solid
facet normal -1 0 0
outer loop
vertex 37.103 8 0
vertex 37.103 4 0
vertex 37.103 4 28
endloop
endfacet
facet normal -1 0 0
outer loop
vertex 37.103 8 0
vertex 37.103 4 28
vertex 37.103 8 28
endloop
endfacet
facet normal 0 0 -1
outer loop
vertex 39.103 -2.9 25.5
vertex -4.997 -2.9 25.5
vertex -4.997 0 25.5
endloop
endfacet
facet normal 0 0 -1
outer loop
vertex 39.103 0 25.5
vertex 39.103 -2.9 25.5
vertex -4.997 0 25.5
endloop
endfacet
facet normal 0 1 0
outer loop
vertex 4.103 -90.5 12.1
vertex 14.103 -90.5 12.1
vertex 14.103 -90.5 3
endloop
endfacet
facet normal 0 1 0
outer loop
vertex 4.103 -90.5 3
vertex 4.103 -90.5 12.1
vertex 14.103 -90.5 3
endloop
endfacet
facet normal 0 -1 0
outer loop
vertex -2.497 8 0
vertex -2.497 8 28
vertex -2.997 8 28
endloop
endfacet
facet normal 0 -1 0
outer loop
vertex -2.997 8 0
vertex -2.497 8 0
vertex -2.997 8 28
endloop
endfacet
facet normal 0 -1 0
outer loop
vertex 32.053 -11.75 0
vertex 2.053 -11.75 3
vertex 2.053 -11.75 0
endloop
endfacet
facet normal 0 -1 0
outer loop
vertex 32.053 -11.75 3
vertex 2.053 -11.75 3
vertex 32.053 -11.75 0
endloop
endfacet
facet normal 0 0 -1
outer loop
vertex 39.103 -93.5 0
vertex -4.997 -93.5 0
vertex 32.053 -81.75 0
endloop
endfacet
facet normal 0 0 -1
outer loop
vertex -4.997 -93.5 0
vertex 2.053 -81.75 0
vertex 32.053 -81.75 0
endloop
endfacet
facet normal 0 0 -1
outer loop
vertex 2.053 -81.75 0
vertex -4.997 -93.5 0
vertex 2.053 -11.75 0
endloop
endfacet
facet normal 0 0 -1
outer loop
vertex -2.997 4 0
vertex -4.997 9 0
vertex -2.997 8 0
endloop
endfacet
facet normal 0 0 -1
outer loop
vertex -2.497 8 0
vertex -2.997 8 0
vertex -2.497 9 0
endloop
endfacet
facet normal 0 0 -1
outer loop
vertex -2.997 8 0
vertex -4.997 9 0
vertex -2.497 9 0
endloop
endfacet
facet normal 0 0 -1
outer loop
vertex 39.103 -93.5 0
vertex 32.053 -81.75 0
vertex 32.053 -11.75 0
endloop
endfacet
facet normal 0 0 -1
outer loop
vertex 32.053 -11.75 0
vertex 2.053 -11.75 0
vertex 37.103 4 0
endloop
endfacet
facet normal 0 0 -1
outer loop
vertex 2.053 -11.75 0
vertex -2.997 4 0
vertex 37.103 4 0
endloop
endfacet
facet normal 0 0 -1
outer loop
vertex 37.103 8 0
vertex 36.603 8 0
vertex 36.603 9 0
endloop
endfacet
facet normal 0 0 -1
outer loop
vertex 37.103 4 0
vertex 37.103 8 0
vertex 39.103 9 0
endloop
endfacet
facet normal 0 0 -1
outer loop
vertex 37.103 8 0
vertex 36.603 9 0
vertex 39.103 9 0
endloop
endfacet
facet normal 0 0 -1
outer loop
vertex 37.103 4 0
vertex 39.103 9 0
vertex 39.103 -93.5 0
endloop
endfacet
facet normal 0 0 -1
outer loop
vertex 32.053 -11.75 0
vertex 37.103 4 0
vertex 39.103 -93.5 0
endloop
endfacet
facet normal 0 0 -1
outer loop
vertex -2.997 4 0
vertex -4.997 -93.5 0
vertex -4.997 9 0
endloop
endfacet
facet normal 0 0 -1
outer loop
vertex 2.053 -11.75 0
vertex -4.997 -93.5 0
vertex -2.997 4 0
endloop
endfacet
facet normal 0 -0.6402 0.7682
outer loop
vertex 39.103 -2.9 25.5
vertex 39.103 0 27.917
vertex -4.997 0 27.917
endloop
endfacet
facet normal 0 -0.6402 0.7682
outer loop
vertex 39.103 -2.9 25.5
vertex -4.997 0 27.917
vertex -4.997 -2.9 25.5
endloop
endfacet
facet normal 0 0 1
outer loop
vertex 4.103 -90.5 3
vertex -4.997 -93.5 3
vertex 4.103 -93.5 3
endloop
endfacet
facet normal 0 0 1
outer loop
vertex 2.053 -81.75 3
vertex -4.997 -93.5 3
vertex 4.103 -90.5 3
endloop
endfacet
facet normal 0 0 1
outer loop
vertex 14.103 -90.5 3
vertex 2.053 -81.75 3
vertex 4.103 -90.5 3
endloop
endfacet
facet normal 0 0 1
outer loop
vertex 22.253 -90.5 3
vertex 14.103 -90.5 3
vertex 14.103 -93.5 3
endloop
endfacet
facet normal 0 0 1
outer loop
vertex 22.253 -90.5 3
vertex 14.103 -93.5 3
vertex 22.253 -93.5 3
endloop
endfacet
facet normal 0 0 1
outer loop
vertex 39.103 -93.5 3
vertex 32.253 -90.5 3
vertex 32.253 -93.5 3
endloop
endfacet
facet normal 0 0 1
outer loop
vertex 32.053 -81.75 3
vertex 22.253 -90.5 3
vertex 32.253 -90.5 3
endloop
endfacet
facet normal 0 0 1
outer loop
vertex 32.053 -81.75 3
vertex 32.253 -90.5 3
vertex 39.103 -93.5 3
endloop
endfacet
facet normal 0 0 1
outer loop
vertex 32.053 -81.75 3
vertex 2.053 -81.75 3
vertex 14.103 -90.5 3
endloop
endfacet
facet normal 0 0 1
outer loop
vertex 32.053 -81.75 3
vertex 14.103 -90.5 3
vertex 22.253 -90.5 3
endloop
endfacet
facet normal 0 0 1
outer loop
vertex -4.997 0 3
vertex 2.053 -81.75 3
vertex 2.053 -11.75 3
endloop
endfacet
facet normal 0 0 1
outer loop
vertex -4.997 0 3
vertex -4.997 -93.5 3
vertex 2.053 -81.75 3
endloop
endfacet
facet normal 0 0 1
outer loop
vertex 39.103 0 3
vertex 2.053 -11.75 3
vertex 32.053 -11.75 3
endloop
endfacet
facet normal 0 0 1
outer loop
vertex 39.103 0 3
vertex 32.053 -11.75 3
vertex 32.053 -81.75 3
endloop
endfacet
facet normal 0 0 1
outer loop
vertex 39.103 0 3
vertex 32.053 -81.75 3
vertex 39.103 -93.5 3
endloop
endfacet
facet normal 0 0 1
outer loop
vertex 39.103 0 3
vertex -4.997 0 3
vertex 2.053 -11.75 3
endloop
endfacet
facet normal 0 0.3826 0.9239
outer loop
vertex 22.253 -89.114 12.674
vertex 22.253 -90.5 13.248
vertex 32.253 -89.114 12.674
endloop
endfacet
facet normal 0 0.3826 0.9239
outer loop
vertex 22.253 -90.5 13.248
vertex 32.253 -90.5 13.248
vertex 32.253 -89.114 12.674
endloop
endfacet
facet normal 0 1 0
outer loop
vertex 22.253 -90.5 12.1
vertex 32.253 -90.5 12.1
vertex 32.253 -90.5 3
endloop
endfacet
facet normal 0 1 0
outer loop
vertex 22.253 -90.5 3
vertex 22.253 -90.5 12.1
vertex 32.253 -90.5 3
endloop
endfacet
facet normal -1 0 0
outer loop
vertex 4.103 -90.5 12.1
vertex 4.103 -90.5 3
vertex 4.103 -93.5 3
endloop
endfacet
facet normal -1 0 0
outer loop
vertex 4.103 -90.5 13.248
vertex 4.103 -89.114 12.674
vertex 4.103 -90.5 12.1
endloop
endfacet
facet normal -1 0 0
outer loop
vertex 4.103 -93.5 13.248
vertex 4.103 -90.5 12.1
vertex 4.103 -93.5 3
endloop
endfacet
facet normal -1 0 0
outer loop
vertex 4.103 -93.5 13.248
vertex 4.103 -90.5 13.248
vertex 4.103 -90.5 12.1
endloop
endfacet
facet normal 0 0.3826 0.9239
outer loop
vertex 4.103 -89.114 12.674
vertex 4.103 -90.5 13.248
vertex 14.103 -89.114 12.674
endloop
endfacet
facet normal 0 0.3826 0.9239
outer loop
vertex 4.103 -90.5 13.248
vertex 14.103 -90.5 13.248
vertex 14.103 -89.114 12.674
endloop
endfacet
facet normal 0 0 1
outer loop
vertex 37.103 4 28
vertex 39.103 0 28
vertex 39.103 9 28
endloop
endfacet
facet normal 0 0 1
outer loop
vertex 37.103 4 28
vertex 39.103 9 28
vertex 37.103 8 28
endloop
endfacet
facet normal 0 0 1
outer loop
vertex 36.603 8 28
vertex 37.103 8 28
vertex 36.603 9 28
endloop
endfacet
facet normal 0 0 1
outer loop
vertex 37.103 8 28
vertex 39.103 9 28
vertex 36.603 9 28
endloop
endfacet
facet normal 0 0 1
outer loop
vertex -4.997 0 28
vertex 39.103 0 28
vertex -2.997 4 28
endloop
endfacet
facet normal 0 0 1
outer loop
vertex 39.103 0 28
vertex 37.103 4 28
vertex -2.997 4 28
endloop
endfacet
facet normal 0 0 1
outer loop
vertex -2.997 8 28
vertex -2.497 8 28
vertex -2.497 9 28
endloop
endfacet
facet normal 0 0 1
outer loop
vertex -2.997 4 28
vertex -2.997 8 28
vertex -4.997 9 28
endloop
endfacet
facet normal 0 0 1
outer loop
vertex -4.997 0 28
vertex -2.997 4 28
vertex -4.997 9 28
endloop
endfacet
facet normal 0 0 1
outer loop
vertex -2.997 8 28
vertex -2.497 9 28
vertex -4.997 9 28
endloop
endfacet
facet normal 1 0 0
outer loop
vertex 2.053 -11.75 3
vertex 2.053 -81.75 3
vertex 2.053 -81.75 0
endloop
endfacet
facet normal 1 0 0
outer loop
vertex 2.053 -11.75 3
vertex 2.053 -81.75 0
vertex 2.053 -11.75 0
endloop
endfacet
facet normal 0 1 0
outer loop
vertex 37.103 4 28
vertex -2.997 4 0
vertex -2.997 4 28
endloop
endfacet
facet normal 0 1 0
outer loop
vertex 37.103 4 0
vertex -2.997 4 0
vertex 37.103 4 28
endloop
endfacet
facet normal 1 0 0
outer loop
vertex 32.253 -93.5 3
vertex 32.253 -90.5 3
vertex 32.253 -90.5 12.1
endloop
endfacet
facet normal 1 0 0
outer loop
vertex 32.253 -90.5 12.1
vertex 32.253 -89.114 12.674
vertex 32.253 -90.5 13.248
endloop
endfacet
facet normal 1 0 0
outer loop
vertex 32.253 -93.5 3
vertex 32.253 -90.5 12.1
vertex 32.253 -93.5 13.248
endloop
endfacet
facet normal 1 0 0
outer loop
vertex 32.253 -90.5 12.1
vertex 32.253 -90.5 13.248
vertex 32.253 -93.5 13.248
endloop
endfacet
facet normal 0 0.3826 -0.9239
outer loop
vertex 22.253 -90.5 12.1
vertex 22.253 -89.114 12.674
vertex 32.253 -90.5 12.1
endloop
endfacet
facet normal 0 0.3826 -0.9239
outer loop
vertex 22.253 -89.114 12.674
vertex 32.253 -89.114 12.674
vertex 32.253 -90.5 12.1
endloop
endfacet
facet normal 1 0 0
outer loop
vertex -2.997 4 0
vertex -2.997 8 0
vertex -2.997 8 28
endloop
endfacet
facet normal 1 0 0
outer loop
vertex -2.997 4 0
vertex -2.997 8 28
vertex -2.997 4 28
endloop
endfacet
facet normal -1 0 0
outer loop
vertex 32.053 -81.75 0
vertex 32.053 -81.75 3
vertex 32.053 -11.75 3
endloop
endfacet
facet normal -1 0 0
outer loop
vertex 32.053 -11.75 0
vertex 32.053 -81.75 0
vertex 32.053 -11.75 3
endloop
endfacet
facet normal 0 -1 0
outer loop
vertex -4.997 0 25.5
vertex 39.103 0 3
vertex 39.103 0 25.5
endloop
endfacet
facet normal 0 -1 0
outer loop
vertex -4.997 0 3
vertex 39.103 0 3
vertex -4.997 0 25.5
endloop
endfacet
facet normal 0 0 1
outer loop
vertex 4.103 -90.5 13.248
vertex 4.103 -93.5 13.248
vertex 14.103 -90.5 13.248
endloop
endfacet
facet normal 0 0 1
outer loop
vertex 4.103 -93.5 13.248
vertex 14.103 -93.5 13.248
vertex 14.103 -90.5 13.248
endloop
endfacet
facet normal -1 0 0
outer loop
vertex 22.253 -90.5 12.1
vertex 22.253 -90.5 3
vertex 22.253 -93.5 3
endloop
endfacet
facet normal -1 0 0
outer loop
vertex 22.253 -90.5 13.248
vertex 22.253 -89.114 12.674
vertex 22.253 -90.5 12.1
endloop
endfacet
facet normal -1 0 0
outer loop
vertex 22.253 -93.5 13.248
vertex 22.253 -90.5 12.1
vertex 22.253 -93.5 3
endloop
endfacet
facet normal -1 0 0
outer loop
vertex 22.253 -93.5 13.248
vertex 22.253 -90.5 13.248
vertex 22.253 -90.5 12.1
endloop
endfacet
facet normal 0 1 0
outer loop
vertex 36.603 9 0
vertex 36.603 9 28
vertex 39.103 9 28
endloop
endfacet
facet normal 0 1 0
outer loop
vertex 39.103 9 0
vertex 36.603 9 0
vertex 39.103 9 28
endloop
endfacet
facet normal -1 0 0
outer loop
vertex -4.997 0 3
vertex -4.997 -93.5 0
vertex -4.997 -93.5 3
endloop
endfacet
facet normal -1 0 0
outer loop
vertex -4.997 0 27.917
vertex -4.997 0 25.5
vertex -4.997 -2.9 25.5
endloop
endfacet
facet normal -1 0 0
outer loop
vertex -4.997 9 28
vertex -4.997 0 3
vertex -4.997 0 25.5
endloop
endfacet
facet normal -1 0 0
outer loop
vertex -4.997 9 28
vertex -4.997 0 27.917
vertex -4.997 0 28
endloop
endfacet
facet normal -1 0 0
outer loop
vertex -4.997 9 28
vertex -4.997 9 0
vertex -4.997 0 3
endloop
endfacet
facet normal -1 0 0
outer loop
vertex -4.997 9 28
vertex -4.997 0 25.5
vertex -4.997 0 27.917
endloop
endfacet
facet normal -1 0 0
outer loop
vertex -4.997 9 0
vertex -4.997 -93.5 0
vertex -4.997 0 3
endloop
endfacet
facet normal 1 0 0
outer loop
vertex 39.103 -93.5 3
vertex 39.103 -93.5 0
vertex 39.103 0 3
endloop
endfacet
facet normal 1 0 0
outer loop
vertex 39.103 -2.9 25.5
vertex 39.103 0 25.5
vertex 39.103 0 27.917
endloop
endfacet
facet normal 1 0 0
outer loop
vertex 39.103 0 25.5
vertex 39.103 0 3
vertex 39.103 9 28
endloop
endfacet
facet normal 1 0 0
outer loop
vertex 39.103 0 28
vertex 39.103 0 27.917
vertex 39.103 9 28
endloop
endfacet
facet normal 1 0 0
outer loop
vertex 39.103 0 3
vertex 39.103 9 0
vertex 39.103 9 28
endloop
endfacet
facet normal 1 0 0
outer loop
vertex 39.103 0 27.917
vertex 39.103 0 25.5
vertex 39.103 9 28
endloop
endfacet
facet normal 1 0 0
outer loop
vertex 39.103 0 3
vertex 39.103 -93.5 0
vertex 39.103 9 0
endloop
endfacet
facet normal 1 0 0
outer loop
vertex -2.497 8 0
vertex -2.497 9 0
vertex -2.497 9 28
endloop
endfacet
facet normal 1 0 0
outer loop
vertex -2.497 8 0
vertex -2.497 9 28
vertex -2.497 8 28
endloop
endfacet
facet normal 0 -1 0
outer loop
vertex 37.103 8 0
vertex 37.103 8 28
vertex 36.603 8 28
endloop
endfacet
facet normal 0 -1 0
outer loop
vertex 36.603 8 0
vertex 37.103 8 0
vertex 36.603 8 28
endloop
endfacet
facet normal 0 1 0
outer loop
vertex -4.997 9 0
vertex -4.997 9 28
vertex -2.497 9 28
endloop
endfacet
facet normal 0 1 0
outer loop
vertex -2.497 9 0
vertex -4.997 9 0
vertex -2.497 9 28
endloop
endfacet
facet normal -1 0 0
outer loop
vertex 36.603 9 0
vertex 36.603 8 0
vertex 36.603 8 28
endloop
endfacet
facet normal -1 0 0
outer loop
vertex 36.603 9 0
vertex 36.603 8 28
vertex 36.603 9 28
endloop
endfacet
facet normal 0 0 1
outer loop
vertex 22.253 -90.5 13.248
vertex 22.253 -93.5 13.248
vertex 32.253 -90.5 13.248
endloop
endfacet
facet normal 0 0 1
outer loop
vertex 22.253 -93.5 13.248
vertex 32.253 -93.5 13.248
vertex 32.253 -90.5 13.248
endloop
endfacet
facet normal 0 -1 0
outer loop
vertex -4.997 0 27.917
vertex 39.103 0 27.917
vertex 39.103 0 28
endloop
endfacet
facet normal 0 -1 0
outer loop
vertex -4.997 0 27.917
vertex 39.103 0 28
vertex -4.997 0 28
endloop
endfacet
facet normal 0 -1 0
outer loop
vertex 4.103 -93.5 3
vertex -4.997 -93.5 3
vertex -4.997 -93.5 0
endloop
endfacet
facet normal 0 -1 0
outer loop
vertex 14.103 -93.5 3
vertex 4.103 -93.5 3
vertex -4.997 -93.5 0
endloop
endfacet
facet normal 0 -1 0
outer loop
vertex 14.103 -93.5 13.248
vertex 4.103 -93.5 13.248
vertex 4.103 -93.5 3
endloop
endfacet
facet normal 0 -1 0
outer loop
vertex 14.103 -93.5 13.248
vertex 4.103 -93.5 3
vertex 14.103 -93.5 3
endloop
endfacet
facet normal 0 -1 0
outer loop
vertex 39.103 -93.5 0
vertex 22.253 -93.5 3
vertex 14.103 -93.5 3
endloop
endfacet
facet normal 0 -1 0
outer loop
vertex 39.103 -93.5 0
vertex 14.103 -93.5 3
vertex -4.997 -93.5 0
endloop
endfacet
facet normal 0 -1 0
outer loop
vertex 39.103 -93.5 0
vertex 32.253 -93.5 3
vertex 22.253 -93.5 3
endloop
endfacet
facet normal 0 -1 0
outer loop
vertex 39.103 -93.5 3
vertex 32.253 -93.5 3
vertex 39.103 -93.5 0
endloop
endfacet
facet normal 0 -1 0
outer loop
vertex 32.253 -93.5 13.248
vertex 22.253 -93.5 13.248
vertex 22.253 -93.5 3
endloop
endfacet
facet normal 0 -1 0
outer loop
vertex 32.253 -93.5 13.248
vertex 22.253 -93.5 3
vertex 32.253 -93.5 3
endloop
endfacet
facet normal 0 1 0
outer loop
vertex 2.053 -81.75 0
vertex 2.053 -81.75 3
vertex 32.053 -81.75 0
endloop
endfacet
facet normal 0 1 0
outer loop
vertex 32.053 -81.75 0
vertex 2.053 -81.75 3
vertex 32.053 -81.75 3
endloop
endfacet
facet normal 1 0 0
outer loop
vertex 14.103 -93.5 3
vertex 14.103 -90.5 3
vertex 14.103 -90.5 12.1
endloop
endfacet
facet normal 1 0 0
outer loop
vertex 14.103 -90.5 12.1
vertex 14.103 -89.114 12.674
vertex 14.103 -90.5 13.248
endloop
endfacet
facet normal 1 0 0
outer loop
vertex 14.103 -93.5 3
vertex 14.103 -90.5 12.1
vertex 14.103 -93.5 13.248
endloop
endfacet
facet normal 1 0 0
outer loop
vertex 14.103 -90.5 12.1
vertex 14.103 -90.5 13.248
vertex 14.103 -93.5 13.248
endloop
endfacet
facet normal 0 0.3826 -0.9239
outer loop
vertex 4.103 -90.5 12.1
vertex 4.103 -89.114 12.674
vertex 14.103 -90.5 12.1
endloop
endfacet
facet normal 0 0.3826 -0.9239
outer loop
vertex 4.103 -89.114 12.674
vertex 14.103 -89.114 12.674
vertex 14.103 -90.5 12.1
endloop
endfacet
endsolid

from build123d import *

# Parameters (mm, degrees)
PAD_DEPTH    = 28
SKETCH002_W  = 44.1
SKETCH002_H  = 3
PAD001_DEPTH = 93.5
PAD002_DEPTH = 5
PAD003_DEPTH = 5
PAD004_DEPTH = 44.1
SKETCH006_W  = 30
SKETCH006_H  = 70
POCKET_DEPTH = 5


with BuildPart() as part:
    # Sketch → Pad (new body)
    with BuildSketch(Plane.XY):
        Polygon((-4.997332, 9), (-2.497332, 9), (-2.497332, 8), (-2.997332, 8), (-2.997332, 4), (37.102668, 4), (37.102668, 8), (36.602668, 8), (36.602668, 9), (39.102668, 9), (39.102668, 0), (-4.997332, 0), (-4.997332, 4), align=None)
    extrude(amount=PAD_DEPTH)

    # Sketch002 (on Face11 of Pad) → Pad001 (join)
    with BuildSketch(Plane.XZ):
        with Locations((17.052668, 1.5)):
            Rectangle(SKETCH002_W, SKETCH002_H)
    extrude(amount=PAD001_DEPTH)

    # Sketch003 (on Face18 of Pad001) → Pad002 (join, symmetric)
    with BuildSketch(Plane.YZ.offset(9.102668)):
        Polygon((-93.5, 2.9), (-93.5, 13.24805), (-90.5, 13.24805), (-89.114181, 12.674025), (-90.5, 12.1), (-90.5, 2.9), align=None)
    extrude(amount=PAD002_DEPTH, both=True)

    # Sketch004 (on Face18 of Pad001) → Pad003 (join, symmetric)
    with BuildSketch(Plane.YZ.offset(27.252668)):
        Polygon((-93.5, 2.9), (-93.5, 13.24805), (-90.5, 13.24805), (-89.114181, 12.674025), (-90.5, 12.1), (-90.5, 2.9), align=None)
    extrude(amount=PAD003_DEPTH, both=True)

    # Sketch005 (on Face14 of Pad003) → Pad004 (join)
    with BuildSketch(Plane.YZ.offset(39.102668)):
        Polygon((0.1, 28), (-2.9, 25.5), (0.1, 25.5), align=None)
    extrude(amount=-PAD004_DEPTH)

    # Sketch006 (on Face26 of Pad004) → Pocket (cut)
    with BuildSketch(Plane.XY.offset(3)):
        with Locations((17.052668, -46.75)):
            Rectangle(SKETCH006_W, SKETCH006_H)
    extrude(amount=-POCKET_DEPTH, mode=Mode.SUBTRACT)


solid = part.part
